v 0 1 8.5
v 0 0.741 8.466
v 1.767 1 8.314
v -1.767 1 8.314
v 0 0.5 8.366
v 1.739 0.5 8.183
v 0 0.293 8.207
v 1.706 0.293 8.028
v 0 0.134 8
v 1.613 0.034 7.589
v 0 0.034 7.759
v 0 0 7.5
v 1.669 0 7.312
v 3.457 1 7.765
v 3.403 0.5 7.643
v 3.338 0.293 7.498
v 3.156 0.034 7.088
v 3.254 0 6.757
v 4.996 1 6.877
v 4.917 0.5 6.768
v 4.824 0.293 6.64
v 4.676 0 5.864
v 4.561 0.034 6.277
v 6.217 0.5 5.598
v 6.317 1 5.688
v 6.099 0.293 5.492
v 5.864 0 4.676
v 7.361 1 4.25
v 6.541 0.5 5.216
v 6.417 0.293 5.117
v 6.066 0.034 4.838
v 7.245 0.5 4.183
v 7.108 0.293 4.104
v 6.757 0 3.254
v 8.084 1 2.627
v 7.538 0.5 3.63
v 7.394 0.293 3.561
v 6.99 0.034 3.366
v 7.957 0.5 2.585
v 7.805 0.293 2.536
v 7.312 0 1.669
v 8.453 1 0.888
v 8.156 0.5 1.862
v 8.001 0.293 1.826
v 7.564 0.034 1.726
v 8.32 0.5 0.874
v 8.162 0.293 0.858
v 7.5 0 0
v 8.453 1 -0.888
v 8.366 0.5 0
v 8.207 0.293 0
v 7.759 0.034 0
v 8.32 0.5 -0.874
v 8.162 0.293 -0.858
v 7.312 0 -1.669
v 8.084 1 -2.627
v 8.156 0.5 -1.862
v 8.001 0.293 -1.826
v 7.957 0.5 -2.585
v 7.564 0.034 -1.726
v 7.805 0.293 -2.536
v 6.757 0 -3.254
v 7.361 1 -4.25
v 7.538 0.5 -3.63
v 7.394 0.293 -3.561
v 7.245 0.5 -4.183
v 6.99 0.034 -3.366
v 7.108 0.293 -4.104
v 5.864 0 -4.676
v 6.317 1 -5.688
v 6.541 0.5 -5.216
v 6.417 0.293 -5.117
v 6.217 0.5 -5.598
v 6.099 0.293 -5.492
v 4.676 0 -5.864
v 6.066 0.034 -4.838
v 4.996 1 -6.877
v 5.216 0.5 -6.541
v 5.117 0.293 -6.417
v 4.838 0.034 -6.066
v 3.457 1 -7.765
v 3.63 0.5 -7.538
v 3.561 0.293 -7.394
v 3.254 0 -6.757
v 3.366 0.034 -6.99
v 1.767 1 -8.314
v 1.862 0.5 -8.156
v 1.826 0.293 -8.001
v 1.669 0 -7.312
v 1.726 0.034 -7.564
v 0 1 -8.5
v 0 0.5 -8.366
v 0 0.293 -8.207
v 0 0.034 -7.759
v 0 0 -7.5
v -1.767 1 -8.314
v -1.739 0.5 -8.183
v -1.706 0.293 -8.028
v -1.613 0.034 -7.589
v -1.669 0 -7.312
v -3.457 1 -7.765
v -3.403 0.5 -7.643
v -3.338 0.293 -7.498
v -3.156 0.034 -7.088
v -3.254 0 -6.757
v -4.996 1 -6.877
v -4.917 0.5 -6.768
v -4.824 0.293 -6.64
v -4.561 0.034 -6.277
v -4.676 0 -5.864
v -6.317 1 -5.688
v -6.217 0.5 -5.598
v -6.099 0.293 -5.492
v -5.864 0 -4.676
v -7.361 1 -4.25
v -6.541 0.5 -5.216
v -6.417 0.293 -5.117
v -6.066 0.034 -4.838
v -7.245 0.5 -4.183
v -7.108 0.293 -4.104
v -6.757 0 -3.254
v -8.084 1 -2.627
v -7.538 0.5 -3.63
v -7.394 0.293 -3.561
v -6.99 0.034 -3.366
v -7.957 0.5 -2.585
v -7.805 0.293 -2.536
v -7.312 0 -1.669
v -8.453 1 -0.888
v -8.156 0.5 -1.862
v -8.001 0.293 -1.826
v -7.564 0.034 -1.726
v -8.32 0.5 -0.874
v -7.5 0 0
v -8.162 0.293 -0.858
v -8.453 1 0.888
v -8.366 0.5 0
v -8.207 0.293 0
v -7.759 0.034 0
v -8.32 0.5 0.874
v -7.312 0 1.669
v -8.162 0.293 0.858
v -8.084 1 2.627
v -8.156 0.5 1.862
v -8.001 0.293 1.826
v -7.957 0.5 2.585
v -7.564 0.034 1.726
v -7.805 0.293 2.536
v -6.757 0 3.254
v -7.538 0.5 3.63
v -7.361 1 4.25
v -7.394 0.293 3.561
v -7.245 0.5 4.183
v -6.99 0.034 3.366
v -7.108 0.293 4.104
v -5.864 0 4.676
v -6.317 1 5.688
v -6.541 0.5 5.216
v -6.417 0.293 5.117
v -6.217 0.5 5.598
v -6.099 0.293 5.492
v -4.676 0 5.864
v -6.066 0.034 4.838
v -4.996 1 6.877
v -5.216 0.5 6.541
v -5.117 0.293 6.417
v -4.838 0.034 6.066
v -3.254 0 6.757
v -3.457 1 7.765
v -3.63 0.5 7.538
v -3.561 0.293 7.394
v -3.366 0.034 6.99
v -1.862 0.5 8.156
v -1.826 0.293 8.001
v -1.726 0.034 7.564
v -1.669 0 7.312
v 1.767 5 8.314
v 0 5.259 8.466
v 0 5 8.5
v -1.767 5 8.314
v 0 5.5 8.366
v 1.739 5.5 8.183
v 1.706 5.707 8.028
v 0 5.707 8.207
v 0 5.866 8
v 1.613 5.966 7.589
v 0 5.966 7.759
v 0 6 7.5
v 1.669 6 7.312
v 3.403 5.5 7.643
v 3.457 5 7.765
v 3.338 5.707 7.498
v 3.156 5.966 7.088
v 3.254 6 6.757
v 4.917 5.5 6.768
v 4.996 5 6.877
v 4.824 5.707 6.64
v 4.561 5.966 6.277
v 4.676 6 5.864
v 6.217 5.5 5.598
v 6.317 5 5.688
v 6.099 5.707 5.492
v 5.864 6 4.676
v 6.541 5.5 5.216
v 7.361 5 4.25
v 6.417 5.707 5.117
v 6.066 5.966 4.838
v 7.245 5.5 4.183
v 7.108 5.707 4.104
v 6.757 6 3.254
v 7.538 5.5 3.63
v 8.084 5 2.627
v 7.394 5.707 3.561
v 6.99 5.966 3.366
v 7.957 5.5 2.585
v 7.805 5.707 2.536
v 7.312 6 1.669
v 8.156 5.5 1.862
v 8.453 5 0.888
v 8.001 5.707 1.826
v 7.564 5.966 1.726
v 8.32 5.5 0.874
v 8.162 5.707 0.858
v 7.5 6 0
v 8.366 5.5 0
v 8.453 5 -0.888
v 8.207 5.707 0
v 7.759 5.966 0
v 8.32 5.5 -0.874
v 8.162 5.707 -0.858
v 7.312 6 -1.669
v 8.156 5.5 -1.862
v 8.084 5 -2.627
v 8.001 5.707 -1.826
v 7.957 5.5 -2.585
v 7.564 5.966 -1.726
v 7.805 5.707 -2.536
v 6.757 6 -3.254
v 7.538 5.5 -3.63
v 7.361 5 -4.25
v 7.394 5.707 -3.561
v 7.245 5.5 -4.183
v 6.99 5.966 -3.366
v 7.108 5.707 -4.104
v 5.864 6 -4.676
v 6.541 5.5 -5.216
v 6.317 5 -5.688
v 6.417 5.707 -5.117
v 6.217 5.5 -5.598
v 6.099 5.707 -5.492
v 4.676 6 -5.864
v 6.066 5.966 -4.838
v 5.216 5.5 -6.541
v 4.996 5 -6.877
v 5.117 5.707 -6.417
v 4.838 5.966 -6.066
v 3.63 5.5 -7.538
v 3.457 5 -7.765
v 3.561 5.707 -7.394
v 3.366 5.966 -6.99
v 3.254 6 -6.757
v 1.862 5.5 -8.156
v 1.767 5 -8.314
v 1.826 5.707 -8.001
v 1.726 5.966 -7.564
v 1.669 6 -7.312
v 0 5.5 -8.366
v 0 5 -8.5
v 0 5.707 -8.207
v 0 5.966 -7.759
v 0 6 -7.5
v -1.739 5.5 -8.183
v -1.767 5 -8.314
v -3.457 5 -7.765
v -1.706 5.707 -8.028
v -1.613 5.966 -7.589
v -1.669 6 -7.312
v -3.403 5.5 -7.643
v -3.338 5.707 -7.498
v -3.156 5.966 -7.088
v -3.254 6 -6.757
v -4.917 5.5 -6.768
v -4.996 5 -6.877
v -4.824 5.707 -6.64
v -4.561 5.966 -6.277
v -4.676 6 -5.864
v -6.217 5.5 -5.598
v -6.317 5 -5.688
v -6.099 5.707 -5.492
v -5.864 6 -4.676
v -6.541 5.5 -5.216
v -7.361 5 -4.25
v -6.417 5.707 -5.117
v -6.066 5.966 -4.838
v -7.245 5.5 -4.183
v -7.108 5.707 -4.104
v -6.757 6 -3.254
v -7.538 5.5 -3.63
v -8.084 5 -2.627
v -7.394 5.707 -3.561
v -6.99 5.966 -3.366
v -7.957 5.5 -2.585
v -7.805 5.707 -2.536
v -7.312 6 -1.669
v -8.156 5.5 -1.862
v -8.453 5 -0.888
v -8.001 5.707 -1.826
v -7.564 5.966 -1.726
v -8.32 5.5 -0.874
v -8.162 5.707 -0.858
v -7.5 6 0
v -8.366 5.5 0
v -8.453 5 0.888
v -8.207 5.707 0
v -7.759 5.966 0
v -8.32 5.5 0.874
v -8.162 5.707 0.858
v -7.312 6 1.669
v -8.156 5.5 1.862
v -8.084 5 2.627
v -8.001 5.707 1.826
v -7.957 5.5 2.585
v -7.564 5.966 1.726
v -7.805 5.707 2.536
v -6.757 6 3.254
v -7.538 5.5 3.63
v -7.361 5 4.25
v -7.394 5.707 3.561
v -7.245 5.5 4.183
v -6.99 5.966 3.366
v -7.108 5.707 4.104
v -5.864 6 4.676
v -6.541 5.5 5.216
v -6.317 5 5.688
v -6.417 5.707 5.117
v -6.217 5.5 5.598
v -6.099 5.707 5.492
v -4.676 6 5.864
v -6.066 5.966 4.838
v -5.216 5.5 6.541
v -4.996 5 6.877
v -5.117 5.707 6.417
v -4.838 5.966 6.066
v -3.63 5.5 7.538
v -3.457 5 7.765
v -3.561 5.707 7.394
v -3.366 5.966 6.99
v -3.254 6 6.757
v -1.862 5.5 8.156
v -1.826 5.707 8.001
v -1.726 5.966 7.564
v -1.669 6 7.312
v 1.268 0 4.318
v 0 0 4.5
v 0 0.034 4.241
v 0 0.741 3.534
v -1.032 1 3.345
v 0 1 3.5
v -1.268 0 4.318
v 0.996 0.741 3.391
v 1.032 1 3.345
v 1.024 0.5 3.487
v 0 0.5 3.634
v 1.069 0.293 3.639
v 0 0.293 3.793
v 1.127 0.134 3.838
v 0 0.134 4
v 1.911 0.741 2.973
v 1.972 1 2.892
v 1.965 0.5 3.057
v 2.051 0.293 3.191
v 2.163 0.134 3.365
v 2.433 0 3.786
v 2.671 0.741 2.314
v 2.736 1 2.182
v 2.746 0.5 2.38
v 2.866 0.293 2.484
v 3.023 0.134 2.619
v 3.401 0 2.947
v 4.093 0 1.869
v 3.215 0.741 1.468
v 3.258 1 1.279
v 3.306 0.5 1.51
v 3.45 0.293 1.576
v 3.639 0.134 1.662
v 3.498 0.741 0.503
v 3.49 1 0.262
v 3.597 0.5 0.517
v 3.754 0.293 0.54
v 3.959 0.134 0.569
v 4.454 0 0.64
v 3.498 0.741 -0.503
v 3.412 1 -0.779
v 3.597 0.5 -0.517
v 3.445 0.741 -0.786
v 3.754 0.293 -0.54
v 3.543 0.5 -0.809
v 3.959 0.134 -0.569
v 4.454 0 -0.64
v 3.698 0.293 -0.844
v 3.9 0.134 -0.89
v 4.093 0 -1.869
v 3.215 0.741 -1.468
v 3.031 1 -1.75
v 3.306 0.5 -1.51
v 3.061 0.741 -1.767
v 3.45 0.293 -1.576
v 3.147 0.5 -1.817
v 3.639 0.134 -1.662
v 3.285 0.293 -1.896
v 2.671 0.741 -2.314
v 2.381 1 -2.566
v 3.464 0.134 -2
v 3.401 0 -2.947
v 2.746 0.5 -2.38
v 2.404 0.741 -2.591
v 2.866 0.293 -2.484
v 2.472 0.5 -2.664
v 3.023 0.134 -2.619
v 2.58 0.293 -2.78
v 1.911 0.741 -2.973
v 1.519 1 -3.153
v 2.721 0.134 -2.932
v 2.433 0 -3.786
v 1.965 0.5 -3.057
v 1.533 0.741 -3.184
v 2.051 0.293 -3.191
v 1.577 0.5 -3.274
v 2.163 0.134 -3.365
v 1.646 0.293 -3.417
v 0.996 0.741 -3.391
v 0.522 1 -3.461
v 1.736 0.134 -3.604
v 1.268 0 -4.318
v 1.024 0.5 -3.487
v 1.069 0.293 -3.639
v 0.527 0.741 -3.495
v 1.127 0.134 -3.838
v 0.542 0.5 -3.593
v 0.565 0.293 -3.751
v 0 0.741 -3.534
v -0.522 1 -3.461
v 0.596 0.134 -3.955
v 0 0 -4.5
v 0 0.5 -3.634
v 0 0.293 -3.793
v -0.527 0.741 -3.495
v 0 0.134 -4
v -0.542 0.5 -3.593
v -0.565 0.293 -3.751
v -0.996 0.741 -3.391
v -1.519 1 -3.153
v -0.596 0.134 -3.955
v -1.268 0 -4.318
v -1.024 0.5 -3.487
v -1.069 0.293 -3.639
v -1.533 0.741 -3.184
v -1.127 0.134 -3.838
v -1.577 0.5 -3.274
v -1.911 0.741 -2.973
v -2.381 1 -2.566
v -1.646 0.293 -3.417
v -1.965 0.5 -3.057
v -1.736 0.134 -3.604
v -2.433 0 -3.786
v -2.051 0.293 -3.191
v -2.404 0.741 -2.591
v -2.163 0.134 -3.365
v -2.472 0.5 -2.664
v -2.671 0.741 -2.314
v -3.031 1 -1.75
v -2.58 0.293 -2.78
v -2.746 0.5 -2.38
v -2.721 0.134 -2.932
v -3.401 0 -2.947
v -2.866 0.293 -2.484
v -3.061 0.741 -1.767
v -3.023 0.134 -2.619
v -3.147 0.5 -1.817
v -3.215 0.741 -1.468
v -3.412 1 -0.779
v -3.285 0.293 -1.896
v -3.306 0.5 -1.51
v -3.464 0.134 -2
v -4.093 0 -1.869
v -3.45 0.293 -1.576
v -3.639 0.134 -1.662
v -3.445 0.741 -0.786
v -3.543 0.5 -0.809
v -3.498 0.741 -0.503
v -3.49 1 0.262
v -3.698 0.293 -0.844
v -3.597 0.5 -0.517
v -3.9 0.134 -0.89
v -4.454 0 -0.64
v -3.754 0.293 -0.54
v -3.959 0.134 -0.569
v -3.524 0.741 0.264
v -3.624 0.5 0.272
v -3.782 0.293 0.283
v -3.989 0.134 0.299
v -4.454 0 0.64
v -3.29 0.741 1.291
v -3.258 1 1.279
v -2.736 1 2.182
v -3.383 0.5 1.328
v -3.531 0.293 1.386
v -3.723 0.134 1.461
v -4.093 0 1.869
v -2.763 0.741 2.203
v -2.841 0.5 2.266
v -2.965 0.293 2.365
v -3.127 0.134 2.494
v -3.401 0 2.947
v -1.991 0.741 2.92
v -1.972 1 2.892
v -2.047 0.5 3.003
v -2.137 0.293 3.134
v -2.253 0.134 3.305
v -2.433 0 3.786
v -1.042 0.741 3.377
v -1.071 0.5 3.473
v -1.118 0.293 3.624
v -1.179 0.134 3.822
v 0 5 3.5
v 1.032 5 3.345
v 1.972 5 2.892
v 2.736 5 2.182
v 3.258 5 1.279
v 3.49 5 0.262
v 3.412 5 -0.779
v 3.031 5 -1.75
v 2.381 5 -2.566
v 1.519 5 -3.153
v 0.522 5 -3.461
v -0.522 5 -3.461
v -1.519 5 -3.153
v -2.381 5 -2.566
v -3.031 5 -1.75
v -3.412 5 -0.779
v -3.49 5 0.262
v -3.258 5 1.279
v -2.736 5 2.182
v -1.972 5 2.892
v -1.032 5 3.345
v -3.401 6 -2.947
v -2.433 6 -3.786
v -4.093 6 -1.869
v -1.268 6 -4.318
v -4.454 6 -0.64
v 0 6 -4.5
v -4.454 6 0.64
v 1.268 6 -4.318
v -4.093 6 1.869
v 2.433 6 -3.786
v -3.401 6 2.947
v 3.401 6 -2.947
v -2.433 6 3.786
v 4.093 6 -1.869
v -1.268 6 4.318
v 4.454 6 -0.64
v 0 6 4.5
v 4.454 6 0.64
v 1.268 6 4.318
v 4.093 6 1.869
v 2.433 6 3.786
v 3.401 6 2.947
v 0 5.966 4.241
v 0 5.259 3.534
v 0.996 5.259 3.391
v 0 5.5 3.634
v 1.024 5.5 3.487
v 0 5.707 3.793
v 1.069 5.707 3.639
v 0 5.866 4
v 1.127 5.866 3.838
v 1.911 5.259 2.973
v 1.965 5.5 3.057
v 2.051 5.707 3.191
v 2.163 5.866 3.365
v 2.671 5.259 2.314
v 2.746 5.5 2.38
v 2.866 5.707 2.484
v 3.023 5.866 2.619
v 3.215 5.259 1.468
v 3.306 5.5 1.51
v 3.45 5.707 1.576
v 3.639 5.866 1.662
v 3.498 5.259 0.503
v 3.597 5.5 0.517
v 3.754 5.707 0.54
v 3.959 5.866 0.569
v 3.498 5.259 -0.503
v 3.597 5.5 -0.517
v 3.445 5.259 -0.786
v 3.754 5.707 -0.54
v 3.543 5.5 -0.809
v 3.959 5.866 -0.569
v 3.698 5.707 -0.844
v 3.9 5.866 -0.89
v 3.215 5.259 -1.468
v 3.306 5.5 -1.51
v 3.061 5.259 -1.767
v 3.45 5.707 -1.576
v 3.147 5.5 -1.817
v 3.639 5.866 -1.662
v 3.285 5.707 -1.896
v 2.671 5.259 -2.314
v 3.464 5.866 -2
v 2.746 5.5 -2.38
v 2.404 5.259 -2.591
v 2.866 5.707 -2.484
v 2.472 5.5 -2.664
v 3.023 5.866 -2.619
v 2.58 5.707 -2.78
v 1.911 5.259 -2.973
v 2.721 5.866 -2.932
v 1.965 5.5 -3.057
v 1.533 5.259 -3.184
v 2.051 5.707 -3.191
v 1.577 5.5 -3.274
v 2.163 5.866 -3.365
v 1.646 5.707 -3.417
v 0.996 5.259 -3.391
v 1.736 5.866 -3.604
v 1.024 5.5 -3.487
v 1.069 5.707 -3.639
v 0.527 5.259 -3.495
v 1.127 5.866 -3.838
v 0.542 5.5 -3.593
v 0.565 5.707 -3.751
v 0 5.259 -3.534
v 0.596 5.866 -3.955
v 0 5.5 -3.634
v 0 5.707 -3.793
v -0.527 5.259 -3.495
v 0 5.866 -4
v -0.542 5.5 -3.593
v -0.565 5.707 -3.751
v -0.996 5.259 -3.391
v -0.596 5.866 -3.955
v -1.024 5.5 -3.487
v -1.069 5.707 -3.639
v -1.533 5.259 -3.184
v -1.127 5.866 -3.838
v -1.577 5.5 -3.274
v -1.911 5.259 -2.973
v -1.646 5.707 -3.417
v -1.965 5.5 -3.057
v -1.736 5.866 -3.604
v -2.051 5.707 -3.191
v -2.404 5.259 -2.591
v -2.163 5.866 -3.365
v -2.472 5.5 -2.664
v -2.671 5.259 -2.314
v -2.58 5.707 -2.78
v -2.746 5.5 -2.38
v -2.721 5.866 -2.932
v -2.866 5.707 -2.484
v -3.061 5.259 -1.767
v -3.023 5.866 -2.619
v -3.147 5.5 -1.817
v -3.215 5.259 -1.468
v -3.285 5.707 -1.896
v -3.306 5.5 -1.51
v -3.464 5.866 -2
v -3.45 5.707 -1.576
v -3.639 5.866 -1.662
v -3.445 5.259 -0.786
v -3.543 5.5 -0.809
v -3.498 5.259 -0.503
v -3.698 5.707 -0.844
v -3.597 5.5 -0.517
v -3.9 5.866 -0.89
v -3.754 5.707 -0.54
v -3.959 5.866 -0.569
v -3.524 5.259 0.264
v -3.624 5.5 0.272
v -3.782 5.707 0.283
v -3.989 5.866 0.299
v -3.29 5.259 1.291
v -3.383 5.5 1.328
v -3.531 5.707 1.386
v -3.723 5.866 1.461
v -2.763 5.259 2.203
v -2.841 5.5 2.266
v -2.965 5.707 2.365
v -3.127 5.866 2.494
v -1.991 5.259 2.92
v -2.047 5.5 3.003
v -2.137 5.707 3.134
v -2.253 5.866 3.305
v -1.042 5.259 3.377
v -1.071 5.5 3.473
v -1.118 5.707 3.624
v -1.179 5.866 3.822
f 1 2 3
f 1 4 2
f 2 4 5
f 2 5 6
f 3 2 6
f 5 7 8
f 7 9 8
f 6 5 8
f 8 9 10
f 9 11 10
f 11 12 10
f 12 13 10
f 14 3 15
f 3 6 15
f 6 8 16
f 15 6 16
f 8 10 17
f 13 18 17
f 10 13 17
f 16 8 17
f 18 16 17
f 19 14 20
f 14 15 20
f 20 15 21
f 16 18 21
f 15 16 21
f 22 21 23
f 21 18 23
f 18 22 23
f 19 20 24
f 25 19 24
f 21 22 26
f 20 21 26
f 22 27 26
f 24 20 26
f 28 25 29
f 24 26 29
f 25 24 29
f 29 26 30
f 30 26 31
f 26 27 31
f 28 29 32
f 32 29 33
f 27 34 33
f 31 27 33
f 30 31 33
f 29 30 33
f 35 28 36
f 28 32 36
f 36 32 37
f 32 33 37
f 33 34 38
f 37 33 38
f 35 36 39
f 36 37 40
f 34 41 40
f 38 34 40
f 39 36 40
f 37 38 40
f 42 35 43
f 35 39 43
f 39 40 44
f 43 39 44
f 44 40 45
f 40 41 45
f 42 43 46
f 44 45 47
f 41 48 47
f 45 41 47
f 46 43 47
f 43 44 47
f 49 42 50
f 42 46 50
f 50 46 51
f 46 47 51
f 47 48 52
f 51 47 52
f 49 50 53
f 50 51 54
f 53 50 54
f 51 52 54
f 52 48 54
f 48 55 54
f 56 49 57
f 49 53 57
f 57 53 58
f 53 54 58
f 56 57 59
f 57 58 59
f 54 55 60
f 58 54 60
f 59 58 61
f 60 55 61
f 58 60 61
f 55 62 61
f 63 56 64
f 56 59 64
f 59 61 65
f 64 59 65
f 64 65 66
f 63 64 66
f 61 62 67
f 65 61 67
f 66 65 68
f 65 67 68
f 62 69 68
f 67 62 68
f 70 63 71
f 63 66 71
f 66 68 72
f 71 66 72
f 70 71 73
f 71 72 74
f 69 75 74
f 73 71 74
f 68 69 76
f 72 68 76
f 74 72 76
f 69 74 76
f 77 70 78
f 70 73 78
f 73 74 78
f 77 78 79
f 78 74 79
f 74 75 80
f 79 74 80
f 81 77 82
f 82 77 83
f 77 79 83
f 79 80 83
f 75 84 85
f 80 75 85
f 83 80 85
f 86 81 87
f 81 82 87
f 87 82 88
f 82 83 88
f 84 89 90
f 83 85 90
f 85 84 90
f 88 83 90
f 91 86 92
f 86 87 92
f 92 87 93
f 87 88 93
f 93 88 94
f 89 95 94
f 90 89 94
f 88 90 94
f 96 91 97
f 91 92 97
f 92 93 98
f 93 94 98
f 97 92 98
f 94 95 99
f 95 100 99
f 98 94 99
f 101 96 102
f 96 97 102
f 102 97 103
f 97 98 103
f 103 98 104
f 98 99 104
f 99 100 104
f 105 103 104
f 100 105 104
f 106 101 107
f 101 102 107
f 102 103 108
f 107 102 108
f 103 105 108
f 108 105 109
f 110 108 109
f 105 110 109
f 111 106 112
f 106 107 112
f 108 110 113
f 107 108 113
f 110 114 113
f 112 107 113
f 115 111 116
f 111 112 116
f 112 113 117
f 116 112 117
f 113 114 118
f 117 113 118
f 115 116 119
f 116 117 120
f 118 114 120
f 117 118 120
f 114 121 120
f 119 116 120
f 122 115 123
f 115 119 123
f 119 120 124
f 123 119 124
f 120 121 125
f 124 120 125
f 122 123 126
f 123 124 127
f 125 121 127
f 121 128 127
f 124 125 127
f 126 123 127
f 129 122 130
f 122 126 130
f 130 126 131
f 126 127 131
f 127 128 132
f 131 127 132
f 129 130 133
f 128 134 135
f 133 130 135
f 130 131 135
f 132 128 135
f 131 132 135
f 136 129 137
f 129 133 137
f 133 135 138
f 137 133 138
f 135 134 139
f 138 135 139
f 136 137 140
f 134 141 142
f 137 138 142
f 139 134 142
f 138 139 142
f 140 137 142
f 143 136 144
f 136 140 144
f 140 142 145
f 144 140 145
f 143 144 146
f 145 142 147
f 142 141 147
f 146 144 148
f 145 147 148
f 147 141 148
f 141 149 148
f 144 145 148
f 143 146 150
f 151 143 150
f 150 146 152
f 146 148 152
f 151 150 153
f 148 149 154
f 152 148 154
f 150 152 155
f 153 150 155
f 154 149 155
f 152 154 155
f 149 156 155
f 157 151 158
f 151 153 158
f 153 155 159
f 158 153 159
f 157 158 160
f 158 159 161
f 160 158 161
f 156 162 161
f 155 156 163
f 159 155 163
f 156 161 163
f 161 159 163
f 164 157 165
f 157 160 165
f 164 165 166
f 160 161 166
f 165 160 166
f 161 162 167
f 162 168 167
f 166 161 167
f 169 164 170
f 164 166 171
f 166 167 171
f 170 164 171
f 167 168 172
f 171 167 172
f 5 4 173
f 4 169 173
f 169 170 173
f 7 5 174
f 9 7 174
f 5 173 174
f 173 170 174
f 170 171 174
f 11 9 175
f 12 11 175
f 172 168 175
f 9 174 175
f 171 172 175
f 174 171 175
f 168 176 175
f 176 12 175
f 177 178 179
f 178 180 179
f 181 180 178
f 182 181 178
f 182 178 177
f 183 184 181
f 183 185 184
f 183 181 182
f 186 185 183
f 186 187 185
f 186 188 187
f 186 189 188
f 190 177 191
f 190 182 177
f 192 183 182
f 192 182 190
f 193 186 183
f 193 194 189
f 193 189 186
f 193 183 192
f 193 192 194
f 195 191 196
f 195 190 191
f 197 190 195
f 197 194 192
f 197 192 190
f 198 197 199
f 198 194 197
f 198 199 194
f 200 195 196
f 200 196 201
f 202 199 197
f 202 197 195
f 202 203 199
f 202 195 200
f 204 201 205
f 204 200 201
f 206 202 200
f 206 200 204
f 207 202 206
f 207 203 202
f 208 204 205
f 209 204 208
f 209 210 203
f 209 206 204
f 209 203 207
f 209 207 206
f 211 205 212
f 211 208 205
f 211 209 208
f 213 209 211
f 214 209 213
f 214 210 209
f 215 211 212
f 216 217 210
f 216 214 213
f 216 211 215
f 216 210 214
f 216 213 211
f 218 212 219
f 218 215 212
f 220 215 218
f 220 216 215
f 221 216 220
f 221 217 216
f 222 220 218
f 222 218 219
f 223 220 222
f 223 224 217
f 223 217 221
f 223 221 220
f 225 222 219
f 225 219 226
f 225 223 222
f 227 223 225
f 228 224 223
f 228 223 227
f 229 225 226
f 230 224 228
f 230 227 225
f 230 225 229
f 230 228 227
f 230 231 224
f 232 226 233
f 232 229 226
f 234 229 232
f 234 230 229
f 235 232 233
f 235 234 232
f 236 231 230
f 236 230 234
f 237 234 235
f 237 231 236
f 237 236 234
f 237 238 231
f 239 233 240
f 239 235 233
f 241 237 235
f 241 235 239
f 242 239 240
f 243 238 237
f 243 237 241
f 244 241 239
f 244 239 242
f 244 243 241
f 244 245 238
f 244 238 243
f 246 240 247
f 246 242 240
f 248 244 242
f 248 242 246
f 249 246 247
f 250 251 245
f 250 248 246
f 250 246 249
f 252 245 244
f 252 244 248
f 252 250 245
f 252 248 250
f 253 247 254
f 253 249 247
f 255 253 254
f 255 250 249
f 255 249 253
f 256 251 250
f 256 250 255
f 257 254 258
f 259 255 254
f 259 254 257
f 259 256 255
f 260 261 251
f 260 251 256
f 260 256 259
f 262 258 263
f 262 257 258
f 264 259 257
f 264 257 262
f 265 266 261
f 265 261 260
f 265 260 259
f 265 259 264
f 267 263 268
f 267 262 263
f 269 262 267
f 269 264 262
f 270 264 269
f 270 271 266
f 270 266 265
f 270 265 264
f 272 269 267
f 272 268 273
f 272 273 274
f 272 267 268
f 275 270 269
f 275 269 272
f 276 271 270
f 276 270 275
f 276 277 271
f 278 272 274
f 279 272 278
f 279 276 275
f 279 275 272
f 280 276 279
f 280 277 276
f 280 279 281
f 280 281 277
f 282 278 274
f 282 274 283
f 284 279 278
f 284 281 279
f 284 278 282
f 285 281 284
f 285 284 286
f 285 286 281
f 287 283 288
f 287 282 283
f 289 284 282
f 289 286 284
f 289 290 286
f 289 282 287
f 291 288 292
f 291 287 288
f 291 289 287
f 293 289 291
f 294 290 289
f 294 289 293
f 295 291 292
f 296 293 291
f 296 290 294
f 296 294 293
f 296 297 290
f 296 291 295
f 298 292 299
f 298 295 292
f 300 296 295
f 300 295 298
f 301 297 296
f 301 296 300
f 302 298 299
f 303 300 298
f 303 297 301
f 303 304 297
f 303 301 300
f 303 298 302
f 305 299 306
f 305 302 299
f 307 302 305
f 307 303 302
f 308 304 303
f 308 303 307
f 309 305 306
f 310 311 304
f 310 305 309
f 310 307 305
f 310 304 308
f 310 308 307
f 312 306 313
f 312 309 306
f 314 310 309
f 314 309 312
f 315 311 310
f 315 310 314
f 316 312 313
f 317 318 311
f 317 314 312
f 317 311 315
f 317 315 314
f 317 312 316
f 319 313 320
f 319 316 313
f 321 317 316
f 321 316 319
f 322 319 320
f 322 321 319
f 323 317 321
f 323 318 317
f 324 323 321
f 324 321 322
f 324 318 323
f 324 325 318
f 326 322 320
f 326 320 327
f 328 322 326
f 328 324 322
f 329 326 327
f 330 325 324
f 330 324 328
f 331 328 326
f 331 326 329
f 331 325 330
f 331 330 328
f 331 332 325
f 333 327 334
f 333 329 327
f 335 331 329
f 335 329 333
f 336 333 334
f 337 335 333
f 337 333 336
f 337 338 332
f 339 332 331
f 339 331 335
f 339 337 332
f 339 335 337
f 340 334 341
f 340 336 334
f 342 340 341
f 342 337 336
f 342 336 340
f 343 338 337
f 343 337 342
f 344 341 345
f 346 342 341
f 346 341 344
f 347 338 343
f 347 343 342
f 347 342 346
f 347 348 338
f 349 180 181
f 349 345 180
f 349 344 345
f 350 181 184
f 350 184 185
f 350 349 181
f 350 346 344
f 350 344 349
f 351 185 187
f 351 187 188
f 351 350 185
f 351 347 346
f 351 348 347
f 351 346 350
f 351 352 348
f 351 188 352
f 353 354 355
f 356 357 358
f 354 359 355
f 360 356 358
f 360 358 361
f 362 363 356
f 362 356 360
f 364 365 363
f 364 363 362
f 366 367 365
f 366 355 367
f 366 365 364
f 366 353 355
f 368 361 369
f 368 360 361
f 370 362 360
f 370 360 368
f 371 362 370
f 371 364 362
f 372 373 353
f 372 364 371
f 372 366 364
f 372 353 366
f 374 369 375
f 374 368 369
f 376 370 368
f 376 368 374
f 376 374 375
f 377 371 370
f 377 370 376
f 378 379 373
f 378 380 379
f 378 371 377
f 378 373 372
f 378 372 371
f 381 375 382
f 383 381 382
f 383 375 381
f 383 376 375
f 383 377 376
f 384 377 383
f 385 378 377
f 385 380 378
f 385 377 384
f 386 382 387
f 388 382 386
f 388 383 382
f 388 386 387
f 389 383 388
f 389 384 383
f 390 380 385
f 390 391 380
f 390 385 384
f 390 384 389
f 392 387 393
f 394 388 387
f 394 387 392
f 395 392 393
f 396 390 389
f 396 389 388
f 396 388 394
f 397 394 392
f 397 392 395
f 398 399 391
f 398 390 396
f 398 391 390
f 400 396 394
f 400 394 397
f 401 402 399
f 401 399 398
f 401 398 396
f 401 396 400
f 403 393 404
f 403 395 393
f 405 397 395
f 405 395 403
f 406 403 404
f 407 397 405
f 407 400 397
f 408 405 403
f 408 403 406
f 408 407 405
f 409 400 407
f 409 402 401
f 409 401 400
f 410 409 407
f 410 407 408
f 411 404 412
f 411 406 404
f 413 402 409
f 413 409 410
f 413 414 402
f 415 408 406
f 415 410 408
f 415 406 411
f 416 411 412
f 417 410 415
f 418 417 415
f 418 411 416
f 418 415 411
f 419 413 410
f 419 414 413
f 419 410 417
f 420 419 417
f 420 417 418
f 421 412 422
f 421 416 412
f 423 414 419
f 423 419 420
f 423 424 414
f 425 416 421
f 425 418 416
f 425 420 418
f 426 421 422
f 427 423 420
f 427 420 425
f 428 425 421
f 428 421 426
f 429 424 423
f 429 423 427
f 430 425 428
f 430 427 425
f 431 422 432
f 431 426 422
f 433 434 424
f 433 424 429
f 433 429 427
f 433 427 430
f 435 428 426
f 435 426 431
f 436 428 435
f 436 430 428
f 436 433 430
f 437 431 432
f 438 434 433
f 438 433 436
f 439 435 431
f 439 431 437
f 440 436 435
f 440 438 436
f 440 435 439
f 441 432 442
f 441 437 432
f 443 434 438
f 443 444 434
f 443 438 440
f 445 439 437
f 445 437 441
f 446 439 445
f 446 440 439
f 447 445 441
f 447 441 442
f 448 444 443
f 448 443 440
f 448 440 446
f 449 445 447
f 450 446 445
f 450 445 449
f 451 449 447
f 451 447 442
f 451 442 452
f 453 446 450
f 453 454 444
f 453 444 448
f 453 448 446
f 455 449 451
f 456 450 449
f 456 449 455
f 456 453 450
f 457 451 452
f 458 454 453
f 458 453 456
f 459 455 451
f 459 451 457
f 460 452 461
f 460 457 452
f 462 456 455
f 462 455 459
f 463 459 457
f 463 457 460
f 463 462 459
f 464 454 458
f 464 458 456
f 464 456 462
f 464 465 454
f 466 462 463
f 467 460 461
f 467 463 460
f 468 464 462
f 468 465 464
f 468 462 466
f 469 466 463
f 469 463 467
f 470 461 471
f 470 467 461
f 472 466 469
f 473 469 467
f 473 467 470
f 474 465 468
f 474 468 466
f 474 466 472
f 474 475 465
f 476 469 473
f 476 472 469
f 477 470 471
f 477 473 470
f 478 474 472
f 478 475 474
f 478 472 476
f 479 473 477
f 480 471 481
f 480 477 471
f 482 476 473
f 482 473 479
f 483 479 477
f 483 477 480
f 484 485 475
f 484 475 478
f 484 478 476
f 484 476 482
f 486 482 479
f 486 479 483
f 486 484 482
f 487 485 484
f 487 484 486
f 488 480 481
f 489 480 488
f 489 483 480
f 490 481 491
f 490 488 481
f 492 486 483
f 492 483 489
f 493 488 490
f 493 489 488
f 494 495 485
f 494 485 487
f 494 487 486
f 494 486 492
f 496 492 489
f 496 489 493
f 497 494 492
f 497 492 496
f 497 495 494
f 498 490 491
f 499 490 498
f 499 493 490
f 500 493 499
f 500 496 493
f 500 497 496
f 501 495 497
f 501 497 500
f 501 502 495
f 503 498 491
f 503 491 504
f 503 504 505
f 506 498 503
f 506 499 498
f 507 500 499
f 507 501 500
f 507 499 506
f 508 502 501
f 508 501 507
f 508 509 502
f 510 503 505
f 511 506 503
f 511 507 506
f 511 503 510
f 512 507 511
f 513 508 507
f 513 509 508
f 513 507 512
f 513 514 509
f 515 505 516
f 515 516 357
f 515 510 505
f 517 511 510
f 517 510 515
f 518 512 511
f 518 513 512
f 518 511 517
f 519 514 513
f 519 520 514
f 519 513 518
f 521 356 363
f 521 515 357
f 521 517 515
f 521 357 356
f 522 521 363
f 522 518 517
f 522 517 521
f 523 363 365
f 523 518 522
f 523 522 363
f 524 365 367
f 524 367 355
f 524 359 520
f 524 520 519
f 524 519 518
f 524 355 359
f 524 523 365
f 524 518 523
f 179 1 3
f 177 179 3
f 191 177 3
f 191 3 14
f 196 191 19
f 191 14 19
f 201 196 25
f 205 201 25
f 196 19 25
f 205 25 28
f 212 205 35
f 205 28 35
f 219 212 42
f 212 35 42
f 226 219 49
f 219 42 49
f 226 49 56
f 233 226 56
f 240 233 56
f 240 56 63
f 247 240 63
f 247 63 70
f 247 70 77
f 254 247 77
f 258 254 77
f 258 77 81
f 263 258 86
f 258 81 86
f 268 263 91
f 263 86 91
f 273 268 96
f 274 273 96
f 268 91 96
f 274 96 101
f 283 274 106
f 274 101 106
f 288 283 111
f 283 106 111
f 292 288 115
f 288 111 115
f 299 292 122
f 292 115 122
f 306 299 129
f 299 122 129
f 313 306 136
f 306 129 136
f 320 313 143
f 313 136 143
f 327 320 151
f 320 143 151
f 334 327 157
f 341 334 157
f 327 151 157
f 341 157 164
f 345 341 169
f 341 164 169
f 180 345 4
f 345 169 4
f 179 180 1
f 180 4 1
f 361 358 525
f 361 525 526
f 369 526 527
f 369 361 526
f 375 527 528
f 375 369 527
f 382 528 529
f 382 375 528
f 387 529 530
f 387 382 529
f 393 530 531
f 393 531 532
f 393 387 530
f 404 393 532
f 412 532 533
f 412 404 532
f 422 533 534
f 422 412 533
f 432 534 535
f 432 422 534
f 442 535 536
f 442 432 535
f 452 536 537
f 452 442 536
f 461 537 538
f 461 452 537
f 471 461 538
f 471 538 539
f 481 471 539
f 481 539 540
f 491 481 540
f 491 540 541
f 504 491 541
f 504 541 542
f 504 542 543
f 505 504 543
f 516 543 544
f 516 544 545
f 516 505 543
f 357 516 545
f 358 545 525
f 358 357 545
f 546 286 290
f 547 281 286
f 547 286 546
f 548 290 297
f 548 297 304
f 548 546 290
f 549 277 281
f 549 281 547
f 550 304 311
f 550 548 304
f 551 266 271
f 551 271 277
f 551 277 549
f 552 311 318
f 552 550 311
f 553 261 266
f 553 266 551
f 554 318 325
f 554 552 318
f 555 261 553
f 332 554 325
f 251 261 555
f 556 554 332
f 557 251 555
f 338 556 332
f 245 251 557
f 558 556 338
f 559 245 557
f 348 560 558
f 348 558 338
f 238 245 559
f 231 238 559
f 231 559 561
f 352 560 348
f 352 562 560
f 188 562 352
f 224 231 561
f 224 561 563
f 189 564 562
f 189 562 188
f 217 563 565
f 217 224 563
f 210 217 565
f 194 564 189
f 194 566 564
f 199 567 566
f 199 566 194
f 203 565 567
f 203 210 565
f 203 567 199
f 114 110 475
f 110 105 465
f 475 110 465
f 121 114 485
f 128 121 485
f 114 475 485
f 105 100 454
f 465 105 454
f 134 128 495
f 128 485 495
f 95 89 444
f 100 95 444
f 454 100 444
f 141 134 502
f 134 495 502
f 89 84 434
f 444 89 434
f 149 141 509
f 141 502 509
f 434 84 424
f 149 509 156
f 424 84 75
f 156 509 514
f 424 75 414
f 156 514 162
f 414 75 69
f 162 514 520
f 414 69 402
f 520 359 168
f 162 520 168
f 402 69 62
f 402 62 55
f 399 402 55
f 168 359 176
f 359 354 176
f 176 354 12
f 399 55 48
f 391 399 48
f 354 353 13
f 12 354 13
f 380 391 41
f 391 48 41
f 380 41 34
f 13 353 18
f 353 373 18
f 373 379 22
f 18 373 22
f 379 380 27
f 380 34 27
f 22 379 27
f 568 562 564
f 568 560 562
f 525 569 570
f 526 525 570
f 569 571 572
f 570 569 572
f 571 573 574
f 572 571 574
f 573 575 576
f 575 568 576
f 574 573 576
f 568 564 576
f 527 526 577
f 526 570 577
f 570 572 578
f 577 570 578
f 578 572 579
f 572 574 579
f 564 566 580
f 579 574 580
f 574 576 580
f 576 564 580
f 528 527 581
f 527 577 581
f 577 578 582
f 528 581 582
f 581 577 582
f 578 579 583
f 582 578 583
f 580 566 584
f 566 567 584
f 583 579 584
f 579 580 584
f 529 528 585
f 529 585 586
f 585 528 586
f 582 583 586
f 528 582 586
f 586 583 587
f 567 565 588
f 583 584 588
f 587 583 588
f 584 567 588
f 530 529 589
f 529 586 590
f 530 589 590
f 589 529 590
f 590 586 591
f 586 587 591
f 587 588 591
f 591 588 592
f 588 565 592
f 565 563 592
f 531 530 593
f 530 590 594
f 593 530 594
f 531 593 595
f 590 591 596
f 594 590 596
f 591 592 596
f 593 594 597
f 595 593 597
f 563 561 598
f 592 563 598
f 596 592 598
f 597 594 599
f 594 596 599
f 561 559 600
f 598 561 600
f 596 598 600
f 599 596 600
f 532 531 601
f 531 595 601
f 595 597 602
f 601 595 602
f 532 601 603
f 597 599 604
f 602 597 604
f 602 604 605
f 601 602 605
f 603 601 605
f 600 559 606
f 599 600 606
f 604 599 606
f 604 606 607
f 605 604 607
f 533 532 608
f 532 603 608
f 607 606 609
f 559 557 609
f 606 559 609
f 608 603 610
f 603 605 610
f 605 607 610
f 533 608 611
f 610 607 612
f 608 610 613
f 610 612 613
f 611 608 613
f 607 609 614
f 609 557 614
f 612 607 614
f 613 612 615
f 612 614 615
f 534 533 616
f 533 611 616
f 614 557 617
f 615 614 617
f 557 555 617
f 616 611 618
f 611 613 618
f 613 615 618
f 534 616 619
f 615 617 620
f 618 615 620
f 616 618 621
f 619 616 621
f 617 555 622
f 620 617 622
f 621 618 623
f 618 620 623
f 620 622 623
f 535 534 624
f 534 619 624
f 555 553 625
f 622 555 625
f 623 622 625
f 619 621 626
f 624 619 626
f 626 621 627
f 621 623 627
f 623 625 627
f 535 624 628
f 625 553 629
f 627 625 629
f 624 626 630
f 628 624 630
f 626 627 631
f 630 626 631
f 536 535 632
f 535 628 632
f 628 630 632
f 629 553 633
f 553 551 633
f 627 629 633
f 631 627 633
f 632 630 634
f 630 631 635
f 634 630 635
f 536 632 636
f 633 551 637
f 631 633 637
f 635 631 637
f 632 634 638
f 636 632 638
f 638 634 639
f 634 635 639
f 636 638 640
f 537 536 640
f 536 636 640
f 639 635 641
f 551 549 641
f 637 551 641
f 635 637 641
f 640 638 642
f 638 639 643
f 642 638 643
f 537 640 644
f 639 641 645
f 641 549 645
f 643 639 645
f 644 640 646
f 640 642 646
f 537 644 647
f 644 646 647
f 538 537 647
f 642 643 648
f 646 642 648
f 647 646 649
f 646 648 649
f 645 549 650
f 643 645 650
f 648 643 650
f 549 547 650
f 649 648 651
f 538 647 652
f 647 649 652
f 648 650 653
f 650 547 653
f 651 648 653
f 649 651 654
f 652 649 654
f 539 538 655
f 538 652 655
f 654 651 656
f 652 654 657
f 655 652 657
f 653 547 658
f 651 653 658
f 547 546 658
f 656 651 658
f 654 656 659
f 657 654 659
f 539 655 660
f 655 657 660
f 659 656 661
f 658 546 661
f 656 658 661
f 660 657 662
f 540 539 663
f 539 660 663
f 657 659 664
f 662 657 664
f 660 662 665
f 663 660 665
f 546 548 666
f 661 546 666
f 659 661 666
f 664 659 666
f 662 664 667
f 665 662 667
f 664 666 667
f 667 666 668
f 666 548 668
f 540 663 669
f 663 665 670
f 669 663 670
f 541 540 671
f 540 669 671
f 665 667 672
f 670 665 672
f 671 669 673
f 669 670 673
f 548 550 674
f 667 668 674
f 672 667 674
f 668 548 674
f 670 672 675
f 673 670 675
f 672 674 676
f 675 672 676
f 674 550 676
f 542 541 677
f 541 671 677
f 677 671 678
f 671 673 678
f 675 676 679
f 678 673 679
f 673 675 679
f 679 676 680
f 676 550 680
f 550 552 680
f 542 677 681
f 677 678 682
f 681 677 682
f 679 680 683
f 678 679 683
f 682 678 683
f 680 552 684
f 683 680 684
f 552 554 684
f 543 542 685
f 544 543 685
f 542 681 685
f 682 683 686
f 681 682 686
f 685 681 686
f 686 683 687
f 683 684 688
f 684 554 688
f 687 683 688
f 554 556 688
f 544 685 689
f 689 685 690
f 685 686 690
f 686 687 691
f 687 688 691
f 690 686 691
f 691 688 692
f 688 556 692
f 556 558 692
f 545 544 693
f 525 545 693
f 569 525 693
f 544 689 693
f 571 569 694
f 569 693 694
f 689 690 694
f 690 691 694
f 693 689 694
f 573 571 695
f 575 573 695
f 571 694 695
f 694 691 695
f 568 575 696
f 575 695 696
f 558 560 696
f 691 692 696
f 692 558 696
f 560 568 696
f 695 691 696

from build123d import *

# Parameters (mm, degrees)
SKETCH_1_R      = 8.5
SKETCH_1_R_2    = 3.5
EXTRUDE_1_DEPTH = 6
FILLET_1_R      = 1
FILLET_2_R      = 1


with BuildPart() as part:
    # 草圖1 → 填料-伸長1 (new body)
    with BuildSketch(Plane(origin=(0, 0, 0), x_dir=(1, 0, 0), z_dir=(0, 1, 0))):
        with Locations(Location((0, 0, 0), (0, 0, 270))):
            Circle(SKETCH_1_R)
        with Locations(Location((0, 0, 0), (0, 0, 270))):
            Circle(SKETCH_1_R_2, mode=Mode.SUBTRACT)
    extrude(amount=EXTRUDE_1_DEPTH)

    # 圓角1
    fillet_1_edges = [part.edges().sort_by_distance(p)[0] for p in [
        (0, 6, -8.5),
        (0, 0, -3.5),
        (0, 6, -3.5),
    ]]
    fillet(fillet_1_edges, radius=FILLET_1_R)

    # 圓角2
    fillet_2_edges = [part.edges().sort_by_distance(p)[0] for p in [
        (0, 0, -8.5),
    ]]
    fillet(fillet_2_edges, radius=FILLET_2_R)


solid = part.part
